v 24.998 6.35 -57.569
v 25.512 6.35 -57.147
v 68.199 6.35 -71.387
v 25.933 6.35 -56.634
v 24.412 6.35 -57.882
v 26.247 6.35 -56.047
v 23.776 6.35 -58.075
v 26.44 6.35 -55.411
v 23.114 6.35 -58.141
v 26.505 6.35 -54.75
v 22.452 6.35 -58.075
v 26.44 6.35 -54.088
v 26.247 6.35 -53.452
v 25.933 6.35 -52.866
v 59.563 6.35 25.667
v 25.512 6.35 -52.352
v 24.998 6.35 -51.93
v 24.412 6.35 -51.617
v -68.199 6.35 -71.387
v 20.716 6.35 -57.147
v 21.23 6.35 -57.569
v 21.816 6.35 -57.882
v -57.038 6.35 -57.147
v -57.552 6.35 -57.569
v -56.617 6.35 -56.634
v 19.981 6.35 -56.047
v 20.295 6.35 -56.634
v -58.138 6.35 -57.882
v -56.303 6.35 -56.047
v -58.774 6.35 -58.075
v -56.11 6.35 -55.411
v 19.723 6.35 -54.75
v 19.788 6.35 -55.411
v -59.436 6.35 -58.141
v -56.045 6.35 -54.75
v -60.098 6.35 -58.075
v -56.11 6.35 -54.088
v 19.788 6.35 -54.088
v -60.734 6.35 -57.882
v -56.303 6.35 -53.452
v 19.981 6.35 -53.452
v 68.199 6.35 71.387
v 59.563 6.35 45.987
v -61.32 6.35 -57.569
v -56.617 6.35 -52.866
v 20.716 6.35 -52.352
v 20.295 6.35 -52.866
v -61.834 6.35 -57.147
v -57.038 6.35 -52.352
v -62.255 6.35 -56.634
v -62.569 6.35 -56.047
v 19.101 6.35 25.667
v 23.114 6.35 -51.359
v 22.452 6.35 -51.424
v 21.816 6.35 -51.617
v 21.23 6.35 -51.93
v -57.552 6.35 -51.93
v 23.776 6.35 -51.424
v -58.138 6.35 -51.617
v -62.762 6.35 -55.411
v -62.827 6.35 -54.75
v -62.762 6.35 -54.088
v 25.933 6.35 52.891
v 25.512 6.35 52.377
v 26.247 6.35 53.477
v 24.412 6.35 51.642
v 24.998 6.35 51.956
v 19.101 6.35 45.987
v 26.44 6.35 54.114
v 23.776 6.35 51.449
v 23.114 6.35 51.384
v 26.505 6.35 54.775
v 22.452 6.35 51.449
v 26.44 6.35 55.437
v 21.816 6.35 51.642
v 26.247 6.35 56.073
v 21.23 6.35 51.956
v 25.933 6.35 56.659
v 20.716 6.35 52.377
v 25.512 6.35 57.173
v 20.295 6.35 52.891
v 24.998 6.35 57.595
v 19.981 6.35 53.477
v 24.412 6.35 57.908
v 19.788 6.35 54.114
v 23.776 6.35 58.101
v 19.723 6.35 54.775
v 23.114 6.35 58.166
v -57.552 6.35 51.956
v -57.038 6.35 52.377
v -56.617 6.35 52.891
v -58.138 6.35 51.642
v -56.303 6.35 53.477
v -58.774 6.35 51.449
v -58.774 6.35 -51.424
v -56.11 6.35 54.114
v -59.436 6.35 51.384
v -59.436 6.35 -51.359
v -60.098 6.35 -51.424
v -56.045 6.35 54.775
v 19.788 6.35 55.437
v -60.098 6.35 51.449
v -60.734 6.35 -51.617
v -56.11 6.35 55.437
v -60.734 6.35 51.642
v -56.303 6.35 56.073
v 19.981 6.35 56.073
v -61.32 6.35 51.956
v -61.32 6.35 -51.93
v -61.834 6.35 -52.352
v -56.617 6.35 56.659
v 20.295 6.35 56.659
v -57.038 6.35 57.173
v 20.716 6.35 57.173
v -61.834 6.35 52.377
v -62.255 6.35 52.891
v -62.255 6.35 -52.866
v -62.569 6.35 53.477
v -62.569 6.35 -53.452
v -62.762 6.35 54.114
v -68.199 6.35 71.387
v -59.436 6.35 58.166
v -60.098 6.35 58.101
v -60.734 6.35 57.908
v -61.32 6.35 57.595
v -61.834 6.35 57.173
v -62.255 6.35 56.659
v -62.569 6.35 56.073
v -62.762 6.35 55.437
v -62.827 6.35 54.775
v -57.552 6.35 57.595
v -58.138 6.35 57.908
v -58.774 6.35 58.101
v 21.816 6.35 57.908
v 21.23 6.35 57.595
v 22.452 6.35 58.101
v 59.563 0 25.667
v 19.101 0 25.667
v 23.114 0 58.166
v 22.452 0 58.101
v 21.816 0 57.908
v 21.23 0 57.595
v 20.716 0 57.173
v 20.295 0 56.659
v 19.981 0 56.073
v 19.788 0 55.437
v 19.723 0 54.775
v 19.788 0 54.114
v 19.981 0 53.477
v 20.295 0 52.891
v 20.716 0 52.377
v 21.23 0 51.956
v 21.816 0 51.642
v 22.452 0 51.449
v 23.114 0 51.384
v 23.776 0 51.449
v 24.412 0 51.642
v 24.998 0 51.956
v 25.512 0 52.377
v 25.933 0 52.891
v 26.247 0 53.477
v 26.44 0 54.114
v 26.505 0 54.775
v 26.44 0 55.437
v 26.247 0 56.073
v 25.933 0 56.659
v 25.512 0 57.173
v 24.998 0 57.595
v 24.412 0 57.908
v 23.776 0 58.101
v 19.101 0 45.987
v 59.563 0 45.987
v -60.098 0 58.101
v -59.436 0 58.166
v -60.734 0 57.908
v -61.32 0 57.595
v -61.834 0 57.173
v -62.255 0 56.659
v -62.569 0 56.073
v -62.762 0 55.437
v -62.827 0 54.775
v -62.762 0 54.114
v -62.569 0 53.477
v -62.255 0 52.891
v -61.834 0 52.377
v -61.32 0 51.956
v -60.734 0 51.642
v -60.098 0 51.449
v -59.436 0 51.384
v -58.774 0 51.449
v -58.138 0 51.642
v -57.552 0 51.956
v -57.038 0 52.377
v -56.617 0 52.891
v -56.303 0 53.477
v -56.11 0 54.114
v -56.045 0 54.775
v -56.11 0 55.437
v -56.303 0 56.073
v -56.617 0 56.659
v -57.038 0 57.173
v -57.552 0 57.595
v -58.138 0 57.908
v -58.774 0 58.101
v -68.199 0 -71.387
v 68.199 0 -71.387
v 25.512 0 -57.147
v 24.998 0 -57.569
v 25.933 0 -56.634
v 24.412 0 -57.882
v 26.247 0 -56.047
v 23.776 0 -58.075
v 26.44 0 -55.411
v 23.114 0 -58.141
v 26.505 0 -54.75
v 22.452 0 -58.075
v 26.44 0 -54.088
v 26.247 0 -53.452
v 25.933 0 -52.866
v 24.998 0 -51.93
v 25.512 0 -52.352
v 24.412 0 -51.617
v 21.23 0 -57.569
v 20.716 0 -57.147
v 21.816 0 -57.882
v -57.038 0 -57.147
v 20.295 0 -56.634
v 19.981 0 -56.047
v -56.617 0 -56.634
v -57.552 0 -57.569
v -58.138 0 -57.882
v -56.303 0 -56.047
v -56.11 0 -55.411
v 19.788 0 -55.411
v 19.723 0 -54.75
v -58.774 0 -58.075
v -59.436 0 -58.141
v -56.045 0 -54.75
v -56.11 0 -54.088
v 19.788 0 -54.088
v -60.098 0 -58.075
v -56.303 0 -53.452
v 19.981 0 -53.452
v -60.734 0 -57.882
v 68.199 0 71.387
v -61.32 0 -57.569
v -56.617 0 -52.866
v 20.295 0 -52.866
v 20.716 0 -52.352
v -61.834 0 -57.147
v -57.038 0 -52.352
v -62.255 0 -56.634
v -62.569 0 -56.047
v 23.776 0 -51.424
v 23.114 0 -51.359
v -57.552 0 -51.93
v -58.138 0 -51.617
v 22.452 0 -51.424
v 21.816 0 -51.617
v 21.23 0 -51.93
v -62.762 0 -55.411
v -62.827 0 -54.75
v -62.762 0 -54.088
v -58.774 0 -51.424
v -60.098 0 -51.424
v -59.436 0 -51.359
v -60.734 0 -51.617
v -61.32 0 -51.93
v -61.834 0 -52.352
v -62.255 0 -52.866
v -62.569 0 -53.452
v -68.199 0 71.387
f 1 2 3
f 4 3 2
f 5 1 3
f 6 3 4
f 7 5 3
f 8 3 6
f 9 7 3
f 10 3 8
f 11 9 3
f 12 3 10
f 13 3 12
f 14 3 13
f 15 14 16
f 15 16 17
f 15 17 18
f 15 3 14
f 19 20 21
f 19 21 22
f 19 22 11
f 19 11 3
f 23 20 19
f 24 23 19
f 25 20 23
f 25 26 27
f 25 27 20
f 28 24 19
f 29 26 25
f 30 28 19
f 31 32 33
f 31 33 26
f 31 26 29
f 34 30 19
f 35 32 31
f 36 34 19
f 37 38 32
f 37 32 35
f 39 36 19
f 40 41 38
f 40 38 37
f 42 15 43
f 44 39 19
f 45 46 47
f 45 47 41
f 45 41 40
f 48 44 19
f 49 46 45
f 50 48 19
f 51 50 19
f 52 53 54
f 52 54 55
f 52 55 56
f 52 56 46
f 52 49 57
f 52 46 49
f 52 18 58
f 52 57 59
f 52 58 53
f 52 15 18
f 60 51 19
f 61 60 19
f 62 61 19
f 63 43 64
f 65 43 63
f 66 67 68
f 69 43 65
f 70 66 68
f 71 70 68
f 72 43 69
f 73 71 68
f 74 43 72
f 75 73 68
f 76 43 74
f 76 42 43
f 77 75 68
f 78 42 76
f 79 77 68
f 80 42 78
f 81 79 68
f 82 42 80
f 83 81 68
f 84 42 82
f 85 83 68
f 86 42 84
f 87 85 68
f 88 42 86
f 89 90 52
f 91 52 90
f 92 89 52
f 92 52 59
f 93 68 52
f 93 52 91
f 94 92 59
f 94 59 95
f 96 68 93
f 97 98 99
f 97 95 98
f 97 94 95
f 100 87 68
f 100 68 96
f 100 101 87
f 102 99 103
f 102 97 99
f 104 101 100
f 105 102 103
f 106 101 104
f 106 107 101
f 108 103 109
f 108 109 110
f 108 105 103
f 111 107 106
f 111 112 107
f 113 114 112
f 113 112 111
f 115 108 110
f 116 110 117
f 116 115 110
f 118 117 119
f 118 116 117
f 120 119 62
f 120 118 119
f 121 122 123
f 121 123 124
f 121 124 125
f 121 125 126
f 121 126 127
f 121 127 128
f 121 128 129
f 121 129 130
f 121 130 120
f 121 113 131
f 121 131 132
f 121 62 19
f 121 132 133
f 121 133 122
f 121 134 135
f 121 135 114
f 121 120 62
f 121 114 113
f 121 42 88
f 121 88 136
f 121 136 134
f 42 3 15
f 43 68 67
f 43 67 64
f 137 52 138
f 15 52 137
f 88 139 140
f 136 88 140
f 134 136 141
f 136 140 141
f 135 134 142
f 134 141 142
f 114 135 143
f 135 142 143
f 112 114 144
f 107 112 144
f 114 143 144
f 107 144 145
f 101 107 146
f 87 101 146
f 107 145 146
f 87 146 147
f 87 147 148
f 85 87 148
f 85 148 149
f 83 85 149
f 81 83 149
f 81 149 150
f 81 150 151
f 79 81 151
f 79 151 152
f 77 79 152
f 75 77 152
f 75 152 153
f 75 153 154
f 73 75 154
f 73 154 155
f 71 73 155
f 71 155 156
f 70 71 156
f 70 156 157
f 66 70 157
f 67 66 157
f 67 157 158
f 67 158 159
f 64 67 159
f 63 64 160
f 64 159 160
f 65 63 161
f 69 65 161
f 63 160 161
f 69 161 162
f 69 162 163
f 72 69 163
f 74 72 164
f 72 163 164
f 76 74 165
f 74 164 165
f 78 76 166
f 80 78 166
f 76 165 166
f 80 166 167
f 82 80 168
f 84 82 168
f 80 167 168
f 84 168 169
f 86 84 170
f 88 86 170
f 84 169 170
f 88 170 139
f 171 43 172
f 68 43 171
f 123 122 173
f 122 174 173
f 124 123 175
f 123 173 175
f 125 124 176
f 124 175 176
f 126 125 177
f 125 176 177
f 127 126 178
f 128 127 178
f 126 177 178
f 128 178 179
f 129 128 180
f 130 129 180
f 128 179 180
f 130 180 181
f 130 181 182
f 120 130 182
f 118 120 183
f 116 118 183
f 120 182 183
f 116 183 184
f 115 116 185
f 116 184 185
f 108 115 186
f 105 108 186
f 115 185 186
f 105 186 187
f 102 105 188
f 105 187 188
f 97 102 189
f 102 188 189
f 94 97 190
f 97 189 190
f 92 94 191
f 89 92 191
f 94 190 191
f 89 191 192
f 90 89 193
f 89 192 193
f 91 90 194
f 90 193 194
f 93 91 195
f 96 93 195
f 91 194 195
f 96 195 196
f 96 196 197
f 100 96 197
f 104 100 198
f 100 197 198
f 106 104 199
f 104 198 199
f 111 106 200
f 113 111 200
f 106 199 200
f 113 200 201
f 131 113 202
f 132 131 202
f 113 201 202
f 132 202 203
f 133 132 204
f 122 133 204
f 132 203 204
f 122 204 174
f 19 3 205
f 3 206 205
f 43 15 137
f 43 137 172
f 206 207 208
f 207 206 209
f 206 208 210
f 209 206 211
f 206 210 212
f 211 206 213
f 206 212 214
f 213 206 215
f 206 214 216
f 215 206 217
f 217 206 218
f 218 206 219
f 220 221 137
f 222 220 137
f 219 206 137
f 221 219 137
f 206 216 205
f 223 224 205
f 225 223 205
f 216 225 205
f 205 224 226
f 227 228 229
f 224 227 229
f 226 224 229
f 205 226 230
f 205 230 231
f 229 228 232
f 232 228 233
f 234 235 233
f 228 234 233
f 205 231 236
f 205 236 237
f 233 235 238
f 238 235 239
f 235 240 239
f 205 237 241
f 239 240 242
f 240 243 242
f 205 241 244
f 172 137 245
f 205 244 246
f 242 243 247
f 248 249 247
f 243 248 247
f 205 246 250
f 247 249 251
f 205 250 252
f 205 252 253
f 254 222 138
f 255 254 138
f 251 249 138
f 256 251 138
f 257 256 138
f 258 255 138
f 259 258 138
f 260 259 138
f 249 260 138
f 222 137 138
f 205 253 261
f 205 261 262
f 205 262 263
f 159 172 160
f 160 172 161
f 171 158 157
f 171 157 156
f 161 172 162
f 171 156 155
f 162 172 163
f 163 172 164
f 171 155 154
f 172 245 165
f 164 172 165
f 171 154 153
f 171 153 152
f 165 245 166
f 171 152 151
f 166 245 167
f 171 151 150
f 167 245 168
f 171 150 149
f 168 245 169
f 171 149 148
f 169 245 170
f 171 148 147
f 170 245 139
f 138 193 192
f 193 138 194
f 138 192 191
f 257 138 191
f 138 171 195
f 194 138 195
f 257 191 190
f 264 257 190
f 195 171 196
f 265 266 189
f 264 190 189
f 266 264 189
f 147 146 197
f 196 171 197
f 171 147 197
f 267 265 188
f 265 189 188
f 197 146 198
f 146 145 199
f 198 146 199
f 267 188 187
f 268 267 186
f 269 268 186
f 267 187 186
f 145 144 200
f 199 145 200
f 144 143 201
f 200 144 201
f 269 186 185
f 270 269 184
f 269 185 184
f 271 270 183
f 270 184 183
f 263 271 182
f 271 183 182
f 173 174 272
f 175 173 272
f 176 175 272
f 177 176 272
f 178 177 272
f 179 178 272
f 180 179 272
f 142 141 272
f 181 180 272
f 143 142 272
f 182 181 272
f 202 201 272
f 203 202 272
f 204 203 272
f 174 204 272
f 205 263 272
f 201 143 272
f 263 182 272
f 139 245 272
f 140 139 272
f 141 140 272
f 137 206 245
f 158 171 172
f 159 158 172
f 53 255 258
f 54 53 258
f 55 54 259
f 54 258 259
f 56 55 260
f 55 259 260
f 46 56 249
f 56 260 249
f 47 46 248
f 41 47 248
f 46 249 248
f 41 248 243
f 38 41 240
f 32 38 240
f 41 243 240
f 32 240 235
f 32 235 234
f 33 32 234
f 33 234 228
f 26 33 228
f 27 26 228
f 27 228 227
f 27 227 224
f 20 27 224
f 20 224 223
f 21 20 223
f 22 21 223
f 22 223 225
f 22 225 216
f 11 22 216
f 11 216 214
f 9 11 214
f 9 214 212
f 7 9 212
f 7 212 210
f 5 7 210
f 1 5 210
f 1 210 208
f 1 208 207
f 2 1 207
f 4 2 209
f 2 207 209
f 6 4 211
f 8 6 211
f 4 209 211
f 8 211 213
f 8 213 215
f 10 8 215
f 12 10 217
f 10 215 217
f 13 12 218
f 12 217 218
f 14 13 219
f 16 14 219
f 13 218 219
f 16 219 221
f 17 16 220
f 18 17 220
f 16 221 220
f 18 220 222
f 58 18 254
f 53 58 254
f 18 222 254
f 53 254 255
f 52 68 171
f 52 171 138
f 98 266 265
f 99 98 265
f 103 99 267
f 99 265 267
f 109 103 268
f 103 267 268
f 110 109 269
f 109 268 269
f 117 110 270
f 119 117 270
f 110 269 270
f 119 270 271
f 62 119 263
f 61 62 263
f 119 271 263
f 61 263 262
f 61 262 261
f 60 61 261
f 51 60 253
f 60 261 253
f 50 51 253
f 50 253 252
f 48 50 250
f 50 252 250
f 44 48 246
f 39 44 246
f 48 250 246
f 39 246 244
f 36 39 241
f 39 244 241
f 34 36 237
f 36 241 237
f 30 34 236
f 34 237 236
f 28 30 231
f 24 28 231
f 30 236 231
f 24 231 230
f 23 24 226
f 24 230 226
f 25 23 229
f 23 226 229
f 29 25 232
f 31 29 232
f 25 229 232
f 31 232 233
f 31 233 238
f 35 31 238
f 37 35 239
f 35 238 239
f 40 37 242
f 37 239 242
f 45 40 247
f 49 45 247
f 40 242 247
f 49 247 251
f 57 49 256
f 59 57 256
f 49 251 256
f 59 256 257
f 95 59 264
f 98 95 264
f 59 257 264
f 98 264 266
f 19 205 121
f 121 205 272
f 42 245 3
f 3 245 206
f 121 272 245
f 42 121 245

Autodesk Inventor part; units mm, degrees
ref_plane "YZ Plane" through (0, 0, 0) normal (1, 0, 0) x (0, 1, 0)
ref_plane "XZ Plane" through (0, 0, 0) normal (0, 1, 0) x (-1, 0, 0)
ref_plane "XY Plane" through (0, 0, 0) normal (0, 0, 1) x (1, 0, 0)
sketch "Sketch1" plane through (0, 0, 0) normal (0, 1, 0) x (-1, 0, 0)
  line L0 (-68.199, -71.3867) -> (68.199, -71.3867)
  line L1 (68.199, -71.3867) -> (68.199, 71.3867)
  line L2 (68.199, 71.3867) -> (-68.199, 71.3867)
  line L3 (-68.199, 71.3867) -> (-68.199, -71.3867)
  line L4 (-68.199, -71.3867) -> (68.199, 71.3867) construction
  line L5 (68.199, -71.3867) -> (-68.199, 71.3867) construction
  point P0 (0, 0)
  dimension "d0" = 136.398
  dimension "d1" = 142.7734
extrude "Extrusion1" add sketch "Sketch1" along normal blind 6.35
sketch "Sketch2" plane through (0, 6.35, 0) normal (0, 1, 0) x (1, 0, 0)
  line L0 (-68.199, 71.3867) -> (-68.199, -71.3867) projected
  line L1 (-68.199, -71.3867) -> (68.199, -71.3867) projected
  line L2 (68.199, -71.3867) -> (68.199, 71.3867) projected
  line L3 (-59.436, -54.7751) -> (-59.436, 54.7497) construction
  line L4 (-59.436, 54.7497) -> (23.114, 54.7497) construction
  line L5 (23.114, 54.7497) -> (23.114, -54.7751) construction
  line L6 (23.114, -54.7751) -> (-59.436, -54.7751) construction
  line L7 (68.199, 71.3867) -> (-68.199, 71.3867) projected
  point P0 (0, 0)
  dimension "d4" = 8.763
  dimension "d5" = 16.6116
  dimension "d8" = 82.55
  dimension "d9" = 109.5248
  dimension "d17" = 16.637
hole "Hole1" at (-59.436, 6.35, -54.7497) at (23.114, 6.35, -54.7497) at (23.114, 6.35, 54.7751) at (-59.436, 6.35, 54.7751) direction (0, -1, 0) diameter 6.7818 end through all thread size "5/16-24 UNF" class "2B" standard "ANSI Unified Screw Threads"
sketch "Sketch3" plane through (0, 6.35, 0) normal (0, 1, 0) x (1, 0, 0)
  line L0 (59.563, -45.9867) -> (19.1008, -45.9867) projected
  line L1 (59.563, -25.6667) -> (59.563, -45.9867) projected
  line L2 (19.1008, -25.6667) -> (59.563, -25.6667) projected
  line L3 (19.1008, -45.9867) -> (19.1008, -25.6667) projected
  point P0 (0, 0)
extrude "Extrusion2" cut sketch "Sketch3" against normal up to next
properties part number "loader_frame"
